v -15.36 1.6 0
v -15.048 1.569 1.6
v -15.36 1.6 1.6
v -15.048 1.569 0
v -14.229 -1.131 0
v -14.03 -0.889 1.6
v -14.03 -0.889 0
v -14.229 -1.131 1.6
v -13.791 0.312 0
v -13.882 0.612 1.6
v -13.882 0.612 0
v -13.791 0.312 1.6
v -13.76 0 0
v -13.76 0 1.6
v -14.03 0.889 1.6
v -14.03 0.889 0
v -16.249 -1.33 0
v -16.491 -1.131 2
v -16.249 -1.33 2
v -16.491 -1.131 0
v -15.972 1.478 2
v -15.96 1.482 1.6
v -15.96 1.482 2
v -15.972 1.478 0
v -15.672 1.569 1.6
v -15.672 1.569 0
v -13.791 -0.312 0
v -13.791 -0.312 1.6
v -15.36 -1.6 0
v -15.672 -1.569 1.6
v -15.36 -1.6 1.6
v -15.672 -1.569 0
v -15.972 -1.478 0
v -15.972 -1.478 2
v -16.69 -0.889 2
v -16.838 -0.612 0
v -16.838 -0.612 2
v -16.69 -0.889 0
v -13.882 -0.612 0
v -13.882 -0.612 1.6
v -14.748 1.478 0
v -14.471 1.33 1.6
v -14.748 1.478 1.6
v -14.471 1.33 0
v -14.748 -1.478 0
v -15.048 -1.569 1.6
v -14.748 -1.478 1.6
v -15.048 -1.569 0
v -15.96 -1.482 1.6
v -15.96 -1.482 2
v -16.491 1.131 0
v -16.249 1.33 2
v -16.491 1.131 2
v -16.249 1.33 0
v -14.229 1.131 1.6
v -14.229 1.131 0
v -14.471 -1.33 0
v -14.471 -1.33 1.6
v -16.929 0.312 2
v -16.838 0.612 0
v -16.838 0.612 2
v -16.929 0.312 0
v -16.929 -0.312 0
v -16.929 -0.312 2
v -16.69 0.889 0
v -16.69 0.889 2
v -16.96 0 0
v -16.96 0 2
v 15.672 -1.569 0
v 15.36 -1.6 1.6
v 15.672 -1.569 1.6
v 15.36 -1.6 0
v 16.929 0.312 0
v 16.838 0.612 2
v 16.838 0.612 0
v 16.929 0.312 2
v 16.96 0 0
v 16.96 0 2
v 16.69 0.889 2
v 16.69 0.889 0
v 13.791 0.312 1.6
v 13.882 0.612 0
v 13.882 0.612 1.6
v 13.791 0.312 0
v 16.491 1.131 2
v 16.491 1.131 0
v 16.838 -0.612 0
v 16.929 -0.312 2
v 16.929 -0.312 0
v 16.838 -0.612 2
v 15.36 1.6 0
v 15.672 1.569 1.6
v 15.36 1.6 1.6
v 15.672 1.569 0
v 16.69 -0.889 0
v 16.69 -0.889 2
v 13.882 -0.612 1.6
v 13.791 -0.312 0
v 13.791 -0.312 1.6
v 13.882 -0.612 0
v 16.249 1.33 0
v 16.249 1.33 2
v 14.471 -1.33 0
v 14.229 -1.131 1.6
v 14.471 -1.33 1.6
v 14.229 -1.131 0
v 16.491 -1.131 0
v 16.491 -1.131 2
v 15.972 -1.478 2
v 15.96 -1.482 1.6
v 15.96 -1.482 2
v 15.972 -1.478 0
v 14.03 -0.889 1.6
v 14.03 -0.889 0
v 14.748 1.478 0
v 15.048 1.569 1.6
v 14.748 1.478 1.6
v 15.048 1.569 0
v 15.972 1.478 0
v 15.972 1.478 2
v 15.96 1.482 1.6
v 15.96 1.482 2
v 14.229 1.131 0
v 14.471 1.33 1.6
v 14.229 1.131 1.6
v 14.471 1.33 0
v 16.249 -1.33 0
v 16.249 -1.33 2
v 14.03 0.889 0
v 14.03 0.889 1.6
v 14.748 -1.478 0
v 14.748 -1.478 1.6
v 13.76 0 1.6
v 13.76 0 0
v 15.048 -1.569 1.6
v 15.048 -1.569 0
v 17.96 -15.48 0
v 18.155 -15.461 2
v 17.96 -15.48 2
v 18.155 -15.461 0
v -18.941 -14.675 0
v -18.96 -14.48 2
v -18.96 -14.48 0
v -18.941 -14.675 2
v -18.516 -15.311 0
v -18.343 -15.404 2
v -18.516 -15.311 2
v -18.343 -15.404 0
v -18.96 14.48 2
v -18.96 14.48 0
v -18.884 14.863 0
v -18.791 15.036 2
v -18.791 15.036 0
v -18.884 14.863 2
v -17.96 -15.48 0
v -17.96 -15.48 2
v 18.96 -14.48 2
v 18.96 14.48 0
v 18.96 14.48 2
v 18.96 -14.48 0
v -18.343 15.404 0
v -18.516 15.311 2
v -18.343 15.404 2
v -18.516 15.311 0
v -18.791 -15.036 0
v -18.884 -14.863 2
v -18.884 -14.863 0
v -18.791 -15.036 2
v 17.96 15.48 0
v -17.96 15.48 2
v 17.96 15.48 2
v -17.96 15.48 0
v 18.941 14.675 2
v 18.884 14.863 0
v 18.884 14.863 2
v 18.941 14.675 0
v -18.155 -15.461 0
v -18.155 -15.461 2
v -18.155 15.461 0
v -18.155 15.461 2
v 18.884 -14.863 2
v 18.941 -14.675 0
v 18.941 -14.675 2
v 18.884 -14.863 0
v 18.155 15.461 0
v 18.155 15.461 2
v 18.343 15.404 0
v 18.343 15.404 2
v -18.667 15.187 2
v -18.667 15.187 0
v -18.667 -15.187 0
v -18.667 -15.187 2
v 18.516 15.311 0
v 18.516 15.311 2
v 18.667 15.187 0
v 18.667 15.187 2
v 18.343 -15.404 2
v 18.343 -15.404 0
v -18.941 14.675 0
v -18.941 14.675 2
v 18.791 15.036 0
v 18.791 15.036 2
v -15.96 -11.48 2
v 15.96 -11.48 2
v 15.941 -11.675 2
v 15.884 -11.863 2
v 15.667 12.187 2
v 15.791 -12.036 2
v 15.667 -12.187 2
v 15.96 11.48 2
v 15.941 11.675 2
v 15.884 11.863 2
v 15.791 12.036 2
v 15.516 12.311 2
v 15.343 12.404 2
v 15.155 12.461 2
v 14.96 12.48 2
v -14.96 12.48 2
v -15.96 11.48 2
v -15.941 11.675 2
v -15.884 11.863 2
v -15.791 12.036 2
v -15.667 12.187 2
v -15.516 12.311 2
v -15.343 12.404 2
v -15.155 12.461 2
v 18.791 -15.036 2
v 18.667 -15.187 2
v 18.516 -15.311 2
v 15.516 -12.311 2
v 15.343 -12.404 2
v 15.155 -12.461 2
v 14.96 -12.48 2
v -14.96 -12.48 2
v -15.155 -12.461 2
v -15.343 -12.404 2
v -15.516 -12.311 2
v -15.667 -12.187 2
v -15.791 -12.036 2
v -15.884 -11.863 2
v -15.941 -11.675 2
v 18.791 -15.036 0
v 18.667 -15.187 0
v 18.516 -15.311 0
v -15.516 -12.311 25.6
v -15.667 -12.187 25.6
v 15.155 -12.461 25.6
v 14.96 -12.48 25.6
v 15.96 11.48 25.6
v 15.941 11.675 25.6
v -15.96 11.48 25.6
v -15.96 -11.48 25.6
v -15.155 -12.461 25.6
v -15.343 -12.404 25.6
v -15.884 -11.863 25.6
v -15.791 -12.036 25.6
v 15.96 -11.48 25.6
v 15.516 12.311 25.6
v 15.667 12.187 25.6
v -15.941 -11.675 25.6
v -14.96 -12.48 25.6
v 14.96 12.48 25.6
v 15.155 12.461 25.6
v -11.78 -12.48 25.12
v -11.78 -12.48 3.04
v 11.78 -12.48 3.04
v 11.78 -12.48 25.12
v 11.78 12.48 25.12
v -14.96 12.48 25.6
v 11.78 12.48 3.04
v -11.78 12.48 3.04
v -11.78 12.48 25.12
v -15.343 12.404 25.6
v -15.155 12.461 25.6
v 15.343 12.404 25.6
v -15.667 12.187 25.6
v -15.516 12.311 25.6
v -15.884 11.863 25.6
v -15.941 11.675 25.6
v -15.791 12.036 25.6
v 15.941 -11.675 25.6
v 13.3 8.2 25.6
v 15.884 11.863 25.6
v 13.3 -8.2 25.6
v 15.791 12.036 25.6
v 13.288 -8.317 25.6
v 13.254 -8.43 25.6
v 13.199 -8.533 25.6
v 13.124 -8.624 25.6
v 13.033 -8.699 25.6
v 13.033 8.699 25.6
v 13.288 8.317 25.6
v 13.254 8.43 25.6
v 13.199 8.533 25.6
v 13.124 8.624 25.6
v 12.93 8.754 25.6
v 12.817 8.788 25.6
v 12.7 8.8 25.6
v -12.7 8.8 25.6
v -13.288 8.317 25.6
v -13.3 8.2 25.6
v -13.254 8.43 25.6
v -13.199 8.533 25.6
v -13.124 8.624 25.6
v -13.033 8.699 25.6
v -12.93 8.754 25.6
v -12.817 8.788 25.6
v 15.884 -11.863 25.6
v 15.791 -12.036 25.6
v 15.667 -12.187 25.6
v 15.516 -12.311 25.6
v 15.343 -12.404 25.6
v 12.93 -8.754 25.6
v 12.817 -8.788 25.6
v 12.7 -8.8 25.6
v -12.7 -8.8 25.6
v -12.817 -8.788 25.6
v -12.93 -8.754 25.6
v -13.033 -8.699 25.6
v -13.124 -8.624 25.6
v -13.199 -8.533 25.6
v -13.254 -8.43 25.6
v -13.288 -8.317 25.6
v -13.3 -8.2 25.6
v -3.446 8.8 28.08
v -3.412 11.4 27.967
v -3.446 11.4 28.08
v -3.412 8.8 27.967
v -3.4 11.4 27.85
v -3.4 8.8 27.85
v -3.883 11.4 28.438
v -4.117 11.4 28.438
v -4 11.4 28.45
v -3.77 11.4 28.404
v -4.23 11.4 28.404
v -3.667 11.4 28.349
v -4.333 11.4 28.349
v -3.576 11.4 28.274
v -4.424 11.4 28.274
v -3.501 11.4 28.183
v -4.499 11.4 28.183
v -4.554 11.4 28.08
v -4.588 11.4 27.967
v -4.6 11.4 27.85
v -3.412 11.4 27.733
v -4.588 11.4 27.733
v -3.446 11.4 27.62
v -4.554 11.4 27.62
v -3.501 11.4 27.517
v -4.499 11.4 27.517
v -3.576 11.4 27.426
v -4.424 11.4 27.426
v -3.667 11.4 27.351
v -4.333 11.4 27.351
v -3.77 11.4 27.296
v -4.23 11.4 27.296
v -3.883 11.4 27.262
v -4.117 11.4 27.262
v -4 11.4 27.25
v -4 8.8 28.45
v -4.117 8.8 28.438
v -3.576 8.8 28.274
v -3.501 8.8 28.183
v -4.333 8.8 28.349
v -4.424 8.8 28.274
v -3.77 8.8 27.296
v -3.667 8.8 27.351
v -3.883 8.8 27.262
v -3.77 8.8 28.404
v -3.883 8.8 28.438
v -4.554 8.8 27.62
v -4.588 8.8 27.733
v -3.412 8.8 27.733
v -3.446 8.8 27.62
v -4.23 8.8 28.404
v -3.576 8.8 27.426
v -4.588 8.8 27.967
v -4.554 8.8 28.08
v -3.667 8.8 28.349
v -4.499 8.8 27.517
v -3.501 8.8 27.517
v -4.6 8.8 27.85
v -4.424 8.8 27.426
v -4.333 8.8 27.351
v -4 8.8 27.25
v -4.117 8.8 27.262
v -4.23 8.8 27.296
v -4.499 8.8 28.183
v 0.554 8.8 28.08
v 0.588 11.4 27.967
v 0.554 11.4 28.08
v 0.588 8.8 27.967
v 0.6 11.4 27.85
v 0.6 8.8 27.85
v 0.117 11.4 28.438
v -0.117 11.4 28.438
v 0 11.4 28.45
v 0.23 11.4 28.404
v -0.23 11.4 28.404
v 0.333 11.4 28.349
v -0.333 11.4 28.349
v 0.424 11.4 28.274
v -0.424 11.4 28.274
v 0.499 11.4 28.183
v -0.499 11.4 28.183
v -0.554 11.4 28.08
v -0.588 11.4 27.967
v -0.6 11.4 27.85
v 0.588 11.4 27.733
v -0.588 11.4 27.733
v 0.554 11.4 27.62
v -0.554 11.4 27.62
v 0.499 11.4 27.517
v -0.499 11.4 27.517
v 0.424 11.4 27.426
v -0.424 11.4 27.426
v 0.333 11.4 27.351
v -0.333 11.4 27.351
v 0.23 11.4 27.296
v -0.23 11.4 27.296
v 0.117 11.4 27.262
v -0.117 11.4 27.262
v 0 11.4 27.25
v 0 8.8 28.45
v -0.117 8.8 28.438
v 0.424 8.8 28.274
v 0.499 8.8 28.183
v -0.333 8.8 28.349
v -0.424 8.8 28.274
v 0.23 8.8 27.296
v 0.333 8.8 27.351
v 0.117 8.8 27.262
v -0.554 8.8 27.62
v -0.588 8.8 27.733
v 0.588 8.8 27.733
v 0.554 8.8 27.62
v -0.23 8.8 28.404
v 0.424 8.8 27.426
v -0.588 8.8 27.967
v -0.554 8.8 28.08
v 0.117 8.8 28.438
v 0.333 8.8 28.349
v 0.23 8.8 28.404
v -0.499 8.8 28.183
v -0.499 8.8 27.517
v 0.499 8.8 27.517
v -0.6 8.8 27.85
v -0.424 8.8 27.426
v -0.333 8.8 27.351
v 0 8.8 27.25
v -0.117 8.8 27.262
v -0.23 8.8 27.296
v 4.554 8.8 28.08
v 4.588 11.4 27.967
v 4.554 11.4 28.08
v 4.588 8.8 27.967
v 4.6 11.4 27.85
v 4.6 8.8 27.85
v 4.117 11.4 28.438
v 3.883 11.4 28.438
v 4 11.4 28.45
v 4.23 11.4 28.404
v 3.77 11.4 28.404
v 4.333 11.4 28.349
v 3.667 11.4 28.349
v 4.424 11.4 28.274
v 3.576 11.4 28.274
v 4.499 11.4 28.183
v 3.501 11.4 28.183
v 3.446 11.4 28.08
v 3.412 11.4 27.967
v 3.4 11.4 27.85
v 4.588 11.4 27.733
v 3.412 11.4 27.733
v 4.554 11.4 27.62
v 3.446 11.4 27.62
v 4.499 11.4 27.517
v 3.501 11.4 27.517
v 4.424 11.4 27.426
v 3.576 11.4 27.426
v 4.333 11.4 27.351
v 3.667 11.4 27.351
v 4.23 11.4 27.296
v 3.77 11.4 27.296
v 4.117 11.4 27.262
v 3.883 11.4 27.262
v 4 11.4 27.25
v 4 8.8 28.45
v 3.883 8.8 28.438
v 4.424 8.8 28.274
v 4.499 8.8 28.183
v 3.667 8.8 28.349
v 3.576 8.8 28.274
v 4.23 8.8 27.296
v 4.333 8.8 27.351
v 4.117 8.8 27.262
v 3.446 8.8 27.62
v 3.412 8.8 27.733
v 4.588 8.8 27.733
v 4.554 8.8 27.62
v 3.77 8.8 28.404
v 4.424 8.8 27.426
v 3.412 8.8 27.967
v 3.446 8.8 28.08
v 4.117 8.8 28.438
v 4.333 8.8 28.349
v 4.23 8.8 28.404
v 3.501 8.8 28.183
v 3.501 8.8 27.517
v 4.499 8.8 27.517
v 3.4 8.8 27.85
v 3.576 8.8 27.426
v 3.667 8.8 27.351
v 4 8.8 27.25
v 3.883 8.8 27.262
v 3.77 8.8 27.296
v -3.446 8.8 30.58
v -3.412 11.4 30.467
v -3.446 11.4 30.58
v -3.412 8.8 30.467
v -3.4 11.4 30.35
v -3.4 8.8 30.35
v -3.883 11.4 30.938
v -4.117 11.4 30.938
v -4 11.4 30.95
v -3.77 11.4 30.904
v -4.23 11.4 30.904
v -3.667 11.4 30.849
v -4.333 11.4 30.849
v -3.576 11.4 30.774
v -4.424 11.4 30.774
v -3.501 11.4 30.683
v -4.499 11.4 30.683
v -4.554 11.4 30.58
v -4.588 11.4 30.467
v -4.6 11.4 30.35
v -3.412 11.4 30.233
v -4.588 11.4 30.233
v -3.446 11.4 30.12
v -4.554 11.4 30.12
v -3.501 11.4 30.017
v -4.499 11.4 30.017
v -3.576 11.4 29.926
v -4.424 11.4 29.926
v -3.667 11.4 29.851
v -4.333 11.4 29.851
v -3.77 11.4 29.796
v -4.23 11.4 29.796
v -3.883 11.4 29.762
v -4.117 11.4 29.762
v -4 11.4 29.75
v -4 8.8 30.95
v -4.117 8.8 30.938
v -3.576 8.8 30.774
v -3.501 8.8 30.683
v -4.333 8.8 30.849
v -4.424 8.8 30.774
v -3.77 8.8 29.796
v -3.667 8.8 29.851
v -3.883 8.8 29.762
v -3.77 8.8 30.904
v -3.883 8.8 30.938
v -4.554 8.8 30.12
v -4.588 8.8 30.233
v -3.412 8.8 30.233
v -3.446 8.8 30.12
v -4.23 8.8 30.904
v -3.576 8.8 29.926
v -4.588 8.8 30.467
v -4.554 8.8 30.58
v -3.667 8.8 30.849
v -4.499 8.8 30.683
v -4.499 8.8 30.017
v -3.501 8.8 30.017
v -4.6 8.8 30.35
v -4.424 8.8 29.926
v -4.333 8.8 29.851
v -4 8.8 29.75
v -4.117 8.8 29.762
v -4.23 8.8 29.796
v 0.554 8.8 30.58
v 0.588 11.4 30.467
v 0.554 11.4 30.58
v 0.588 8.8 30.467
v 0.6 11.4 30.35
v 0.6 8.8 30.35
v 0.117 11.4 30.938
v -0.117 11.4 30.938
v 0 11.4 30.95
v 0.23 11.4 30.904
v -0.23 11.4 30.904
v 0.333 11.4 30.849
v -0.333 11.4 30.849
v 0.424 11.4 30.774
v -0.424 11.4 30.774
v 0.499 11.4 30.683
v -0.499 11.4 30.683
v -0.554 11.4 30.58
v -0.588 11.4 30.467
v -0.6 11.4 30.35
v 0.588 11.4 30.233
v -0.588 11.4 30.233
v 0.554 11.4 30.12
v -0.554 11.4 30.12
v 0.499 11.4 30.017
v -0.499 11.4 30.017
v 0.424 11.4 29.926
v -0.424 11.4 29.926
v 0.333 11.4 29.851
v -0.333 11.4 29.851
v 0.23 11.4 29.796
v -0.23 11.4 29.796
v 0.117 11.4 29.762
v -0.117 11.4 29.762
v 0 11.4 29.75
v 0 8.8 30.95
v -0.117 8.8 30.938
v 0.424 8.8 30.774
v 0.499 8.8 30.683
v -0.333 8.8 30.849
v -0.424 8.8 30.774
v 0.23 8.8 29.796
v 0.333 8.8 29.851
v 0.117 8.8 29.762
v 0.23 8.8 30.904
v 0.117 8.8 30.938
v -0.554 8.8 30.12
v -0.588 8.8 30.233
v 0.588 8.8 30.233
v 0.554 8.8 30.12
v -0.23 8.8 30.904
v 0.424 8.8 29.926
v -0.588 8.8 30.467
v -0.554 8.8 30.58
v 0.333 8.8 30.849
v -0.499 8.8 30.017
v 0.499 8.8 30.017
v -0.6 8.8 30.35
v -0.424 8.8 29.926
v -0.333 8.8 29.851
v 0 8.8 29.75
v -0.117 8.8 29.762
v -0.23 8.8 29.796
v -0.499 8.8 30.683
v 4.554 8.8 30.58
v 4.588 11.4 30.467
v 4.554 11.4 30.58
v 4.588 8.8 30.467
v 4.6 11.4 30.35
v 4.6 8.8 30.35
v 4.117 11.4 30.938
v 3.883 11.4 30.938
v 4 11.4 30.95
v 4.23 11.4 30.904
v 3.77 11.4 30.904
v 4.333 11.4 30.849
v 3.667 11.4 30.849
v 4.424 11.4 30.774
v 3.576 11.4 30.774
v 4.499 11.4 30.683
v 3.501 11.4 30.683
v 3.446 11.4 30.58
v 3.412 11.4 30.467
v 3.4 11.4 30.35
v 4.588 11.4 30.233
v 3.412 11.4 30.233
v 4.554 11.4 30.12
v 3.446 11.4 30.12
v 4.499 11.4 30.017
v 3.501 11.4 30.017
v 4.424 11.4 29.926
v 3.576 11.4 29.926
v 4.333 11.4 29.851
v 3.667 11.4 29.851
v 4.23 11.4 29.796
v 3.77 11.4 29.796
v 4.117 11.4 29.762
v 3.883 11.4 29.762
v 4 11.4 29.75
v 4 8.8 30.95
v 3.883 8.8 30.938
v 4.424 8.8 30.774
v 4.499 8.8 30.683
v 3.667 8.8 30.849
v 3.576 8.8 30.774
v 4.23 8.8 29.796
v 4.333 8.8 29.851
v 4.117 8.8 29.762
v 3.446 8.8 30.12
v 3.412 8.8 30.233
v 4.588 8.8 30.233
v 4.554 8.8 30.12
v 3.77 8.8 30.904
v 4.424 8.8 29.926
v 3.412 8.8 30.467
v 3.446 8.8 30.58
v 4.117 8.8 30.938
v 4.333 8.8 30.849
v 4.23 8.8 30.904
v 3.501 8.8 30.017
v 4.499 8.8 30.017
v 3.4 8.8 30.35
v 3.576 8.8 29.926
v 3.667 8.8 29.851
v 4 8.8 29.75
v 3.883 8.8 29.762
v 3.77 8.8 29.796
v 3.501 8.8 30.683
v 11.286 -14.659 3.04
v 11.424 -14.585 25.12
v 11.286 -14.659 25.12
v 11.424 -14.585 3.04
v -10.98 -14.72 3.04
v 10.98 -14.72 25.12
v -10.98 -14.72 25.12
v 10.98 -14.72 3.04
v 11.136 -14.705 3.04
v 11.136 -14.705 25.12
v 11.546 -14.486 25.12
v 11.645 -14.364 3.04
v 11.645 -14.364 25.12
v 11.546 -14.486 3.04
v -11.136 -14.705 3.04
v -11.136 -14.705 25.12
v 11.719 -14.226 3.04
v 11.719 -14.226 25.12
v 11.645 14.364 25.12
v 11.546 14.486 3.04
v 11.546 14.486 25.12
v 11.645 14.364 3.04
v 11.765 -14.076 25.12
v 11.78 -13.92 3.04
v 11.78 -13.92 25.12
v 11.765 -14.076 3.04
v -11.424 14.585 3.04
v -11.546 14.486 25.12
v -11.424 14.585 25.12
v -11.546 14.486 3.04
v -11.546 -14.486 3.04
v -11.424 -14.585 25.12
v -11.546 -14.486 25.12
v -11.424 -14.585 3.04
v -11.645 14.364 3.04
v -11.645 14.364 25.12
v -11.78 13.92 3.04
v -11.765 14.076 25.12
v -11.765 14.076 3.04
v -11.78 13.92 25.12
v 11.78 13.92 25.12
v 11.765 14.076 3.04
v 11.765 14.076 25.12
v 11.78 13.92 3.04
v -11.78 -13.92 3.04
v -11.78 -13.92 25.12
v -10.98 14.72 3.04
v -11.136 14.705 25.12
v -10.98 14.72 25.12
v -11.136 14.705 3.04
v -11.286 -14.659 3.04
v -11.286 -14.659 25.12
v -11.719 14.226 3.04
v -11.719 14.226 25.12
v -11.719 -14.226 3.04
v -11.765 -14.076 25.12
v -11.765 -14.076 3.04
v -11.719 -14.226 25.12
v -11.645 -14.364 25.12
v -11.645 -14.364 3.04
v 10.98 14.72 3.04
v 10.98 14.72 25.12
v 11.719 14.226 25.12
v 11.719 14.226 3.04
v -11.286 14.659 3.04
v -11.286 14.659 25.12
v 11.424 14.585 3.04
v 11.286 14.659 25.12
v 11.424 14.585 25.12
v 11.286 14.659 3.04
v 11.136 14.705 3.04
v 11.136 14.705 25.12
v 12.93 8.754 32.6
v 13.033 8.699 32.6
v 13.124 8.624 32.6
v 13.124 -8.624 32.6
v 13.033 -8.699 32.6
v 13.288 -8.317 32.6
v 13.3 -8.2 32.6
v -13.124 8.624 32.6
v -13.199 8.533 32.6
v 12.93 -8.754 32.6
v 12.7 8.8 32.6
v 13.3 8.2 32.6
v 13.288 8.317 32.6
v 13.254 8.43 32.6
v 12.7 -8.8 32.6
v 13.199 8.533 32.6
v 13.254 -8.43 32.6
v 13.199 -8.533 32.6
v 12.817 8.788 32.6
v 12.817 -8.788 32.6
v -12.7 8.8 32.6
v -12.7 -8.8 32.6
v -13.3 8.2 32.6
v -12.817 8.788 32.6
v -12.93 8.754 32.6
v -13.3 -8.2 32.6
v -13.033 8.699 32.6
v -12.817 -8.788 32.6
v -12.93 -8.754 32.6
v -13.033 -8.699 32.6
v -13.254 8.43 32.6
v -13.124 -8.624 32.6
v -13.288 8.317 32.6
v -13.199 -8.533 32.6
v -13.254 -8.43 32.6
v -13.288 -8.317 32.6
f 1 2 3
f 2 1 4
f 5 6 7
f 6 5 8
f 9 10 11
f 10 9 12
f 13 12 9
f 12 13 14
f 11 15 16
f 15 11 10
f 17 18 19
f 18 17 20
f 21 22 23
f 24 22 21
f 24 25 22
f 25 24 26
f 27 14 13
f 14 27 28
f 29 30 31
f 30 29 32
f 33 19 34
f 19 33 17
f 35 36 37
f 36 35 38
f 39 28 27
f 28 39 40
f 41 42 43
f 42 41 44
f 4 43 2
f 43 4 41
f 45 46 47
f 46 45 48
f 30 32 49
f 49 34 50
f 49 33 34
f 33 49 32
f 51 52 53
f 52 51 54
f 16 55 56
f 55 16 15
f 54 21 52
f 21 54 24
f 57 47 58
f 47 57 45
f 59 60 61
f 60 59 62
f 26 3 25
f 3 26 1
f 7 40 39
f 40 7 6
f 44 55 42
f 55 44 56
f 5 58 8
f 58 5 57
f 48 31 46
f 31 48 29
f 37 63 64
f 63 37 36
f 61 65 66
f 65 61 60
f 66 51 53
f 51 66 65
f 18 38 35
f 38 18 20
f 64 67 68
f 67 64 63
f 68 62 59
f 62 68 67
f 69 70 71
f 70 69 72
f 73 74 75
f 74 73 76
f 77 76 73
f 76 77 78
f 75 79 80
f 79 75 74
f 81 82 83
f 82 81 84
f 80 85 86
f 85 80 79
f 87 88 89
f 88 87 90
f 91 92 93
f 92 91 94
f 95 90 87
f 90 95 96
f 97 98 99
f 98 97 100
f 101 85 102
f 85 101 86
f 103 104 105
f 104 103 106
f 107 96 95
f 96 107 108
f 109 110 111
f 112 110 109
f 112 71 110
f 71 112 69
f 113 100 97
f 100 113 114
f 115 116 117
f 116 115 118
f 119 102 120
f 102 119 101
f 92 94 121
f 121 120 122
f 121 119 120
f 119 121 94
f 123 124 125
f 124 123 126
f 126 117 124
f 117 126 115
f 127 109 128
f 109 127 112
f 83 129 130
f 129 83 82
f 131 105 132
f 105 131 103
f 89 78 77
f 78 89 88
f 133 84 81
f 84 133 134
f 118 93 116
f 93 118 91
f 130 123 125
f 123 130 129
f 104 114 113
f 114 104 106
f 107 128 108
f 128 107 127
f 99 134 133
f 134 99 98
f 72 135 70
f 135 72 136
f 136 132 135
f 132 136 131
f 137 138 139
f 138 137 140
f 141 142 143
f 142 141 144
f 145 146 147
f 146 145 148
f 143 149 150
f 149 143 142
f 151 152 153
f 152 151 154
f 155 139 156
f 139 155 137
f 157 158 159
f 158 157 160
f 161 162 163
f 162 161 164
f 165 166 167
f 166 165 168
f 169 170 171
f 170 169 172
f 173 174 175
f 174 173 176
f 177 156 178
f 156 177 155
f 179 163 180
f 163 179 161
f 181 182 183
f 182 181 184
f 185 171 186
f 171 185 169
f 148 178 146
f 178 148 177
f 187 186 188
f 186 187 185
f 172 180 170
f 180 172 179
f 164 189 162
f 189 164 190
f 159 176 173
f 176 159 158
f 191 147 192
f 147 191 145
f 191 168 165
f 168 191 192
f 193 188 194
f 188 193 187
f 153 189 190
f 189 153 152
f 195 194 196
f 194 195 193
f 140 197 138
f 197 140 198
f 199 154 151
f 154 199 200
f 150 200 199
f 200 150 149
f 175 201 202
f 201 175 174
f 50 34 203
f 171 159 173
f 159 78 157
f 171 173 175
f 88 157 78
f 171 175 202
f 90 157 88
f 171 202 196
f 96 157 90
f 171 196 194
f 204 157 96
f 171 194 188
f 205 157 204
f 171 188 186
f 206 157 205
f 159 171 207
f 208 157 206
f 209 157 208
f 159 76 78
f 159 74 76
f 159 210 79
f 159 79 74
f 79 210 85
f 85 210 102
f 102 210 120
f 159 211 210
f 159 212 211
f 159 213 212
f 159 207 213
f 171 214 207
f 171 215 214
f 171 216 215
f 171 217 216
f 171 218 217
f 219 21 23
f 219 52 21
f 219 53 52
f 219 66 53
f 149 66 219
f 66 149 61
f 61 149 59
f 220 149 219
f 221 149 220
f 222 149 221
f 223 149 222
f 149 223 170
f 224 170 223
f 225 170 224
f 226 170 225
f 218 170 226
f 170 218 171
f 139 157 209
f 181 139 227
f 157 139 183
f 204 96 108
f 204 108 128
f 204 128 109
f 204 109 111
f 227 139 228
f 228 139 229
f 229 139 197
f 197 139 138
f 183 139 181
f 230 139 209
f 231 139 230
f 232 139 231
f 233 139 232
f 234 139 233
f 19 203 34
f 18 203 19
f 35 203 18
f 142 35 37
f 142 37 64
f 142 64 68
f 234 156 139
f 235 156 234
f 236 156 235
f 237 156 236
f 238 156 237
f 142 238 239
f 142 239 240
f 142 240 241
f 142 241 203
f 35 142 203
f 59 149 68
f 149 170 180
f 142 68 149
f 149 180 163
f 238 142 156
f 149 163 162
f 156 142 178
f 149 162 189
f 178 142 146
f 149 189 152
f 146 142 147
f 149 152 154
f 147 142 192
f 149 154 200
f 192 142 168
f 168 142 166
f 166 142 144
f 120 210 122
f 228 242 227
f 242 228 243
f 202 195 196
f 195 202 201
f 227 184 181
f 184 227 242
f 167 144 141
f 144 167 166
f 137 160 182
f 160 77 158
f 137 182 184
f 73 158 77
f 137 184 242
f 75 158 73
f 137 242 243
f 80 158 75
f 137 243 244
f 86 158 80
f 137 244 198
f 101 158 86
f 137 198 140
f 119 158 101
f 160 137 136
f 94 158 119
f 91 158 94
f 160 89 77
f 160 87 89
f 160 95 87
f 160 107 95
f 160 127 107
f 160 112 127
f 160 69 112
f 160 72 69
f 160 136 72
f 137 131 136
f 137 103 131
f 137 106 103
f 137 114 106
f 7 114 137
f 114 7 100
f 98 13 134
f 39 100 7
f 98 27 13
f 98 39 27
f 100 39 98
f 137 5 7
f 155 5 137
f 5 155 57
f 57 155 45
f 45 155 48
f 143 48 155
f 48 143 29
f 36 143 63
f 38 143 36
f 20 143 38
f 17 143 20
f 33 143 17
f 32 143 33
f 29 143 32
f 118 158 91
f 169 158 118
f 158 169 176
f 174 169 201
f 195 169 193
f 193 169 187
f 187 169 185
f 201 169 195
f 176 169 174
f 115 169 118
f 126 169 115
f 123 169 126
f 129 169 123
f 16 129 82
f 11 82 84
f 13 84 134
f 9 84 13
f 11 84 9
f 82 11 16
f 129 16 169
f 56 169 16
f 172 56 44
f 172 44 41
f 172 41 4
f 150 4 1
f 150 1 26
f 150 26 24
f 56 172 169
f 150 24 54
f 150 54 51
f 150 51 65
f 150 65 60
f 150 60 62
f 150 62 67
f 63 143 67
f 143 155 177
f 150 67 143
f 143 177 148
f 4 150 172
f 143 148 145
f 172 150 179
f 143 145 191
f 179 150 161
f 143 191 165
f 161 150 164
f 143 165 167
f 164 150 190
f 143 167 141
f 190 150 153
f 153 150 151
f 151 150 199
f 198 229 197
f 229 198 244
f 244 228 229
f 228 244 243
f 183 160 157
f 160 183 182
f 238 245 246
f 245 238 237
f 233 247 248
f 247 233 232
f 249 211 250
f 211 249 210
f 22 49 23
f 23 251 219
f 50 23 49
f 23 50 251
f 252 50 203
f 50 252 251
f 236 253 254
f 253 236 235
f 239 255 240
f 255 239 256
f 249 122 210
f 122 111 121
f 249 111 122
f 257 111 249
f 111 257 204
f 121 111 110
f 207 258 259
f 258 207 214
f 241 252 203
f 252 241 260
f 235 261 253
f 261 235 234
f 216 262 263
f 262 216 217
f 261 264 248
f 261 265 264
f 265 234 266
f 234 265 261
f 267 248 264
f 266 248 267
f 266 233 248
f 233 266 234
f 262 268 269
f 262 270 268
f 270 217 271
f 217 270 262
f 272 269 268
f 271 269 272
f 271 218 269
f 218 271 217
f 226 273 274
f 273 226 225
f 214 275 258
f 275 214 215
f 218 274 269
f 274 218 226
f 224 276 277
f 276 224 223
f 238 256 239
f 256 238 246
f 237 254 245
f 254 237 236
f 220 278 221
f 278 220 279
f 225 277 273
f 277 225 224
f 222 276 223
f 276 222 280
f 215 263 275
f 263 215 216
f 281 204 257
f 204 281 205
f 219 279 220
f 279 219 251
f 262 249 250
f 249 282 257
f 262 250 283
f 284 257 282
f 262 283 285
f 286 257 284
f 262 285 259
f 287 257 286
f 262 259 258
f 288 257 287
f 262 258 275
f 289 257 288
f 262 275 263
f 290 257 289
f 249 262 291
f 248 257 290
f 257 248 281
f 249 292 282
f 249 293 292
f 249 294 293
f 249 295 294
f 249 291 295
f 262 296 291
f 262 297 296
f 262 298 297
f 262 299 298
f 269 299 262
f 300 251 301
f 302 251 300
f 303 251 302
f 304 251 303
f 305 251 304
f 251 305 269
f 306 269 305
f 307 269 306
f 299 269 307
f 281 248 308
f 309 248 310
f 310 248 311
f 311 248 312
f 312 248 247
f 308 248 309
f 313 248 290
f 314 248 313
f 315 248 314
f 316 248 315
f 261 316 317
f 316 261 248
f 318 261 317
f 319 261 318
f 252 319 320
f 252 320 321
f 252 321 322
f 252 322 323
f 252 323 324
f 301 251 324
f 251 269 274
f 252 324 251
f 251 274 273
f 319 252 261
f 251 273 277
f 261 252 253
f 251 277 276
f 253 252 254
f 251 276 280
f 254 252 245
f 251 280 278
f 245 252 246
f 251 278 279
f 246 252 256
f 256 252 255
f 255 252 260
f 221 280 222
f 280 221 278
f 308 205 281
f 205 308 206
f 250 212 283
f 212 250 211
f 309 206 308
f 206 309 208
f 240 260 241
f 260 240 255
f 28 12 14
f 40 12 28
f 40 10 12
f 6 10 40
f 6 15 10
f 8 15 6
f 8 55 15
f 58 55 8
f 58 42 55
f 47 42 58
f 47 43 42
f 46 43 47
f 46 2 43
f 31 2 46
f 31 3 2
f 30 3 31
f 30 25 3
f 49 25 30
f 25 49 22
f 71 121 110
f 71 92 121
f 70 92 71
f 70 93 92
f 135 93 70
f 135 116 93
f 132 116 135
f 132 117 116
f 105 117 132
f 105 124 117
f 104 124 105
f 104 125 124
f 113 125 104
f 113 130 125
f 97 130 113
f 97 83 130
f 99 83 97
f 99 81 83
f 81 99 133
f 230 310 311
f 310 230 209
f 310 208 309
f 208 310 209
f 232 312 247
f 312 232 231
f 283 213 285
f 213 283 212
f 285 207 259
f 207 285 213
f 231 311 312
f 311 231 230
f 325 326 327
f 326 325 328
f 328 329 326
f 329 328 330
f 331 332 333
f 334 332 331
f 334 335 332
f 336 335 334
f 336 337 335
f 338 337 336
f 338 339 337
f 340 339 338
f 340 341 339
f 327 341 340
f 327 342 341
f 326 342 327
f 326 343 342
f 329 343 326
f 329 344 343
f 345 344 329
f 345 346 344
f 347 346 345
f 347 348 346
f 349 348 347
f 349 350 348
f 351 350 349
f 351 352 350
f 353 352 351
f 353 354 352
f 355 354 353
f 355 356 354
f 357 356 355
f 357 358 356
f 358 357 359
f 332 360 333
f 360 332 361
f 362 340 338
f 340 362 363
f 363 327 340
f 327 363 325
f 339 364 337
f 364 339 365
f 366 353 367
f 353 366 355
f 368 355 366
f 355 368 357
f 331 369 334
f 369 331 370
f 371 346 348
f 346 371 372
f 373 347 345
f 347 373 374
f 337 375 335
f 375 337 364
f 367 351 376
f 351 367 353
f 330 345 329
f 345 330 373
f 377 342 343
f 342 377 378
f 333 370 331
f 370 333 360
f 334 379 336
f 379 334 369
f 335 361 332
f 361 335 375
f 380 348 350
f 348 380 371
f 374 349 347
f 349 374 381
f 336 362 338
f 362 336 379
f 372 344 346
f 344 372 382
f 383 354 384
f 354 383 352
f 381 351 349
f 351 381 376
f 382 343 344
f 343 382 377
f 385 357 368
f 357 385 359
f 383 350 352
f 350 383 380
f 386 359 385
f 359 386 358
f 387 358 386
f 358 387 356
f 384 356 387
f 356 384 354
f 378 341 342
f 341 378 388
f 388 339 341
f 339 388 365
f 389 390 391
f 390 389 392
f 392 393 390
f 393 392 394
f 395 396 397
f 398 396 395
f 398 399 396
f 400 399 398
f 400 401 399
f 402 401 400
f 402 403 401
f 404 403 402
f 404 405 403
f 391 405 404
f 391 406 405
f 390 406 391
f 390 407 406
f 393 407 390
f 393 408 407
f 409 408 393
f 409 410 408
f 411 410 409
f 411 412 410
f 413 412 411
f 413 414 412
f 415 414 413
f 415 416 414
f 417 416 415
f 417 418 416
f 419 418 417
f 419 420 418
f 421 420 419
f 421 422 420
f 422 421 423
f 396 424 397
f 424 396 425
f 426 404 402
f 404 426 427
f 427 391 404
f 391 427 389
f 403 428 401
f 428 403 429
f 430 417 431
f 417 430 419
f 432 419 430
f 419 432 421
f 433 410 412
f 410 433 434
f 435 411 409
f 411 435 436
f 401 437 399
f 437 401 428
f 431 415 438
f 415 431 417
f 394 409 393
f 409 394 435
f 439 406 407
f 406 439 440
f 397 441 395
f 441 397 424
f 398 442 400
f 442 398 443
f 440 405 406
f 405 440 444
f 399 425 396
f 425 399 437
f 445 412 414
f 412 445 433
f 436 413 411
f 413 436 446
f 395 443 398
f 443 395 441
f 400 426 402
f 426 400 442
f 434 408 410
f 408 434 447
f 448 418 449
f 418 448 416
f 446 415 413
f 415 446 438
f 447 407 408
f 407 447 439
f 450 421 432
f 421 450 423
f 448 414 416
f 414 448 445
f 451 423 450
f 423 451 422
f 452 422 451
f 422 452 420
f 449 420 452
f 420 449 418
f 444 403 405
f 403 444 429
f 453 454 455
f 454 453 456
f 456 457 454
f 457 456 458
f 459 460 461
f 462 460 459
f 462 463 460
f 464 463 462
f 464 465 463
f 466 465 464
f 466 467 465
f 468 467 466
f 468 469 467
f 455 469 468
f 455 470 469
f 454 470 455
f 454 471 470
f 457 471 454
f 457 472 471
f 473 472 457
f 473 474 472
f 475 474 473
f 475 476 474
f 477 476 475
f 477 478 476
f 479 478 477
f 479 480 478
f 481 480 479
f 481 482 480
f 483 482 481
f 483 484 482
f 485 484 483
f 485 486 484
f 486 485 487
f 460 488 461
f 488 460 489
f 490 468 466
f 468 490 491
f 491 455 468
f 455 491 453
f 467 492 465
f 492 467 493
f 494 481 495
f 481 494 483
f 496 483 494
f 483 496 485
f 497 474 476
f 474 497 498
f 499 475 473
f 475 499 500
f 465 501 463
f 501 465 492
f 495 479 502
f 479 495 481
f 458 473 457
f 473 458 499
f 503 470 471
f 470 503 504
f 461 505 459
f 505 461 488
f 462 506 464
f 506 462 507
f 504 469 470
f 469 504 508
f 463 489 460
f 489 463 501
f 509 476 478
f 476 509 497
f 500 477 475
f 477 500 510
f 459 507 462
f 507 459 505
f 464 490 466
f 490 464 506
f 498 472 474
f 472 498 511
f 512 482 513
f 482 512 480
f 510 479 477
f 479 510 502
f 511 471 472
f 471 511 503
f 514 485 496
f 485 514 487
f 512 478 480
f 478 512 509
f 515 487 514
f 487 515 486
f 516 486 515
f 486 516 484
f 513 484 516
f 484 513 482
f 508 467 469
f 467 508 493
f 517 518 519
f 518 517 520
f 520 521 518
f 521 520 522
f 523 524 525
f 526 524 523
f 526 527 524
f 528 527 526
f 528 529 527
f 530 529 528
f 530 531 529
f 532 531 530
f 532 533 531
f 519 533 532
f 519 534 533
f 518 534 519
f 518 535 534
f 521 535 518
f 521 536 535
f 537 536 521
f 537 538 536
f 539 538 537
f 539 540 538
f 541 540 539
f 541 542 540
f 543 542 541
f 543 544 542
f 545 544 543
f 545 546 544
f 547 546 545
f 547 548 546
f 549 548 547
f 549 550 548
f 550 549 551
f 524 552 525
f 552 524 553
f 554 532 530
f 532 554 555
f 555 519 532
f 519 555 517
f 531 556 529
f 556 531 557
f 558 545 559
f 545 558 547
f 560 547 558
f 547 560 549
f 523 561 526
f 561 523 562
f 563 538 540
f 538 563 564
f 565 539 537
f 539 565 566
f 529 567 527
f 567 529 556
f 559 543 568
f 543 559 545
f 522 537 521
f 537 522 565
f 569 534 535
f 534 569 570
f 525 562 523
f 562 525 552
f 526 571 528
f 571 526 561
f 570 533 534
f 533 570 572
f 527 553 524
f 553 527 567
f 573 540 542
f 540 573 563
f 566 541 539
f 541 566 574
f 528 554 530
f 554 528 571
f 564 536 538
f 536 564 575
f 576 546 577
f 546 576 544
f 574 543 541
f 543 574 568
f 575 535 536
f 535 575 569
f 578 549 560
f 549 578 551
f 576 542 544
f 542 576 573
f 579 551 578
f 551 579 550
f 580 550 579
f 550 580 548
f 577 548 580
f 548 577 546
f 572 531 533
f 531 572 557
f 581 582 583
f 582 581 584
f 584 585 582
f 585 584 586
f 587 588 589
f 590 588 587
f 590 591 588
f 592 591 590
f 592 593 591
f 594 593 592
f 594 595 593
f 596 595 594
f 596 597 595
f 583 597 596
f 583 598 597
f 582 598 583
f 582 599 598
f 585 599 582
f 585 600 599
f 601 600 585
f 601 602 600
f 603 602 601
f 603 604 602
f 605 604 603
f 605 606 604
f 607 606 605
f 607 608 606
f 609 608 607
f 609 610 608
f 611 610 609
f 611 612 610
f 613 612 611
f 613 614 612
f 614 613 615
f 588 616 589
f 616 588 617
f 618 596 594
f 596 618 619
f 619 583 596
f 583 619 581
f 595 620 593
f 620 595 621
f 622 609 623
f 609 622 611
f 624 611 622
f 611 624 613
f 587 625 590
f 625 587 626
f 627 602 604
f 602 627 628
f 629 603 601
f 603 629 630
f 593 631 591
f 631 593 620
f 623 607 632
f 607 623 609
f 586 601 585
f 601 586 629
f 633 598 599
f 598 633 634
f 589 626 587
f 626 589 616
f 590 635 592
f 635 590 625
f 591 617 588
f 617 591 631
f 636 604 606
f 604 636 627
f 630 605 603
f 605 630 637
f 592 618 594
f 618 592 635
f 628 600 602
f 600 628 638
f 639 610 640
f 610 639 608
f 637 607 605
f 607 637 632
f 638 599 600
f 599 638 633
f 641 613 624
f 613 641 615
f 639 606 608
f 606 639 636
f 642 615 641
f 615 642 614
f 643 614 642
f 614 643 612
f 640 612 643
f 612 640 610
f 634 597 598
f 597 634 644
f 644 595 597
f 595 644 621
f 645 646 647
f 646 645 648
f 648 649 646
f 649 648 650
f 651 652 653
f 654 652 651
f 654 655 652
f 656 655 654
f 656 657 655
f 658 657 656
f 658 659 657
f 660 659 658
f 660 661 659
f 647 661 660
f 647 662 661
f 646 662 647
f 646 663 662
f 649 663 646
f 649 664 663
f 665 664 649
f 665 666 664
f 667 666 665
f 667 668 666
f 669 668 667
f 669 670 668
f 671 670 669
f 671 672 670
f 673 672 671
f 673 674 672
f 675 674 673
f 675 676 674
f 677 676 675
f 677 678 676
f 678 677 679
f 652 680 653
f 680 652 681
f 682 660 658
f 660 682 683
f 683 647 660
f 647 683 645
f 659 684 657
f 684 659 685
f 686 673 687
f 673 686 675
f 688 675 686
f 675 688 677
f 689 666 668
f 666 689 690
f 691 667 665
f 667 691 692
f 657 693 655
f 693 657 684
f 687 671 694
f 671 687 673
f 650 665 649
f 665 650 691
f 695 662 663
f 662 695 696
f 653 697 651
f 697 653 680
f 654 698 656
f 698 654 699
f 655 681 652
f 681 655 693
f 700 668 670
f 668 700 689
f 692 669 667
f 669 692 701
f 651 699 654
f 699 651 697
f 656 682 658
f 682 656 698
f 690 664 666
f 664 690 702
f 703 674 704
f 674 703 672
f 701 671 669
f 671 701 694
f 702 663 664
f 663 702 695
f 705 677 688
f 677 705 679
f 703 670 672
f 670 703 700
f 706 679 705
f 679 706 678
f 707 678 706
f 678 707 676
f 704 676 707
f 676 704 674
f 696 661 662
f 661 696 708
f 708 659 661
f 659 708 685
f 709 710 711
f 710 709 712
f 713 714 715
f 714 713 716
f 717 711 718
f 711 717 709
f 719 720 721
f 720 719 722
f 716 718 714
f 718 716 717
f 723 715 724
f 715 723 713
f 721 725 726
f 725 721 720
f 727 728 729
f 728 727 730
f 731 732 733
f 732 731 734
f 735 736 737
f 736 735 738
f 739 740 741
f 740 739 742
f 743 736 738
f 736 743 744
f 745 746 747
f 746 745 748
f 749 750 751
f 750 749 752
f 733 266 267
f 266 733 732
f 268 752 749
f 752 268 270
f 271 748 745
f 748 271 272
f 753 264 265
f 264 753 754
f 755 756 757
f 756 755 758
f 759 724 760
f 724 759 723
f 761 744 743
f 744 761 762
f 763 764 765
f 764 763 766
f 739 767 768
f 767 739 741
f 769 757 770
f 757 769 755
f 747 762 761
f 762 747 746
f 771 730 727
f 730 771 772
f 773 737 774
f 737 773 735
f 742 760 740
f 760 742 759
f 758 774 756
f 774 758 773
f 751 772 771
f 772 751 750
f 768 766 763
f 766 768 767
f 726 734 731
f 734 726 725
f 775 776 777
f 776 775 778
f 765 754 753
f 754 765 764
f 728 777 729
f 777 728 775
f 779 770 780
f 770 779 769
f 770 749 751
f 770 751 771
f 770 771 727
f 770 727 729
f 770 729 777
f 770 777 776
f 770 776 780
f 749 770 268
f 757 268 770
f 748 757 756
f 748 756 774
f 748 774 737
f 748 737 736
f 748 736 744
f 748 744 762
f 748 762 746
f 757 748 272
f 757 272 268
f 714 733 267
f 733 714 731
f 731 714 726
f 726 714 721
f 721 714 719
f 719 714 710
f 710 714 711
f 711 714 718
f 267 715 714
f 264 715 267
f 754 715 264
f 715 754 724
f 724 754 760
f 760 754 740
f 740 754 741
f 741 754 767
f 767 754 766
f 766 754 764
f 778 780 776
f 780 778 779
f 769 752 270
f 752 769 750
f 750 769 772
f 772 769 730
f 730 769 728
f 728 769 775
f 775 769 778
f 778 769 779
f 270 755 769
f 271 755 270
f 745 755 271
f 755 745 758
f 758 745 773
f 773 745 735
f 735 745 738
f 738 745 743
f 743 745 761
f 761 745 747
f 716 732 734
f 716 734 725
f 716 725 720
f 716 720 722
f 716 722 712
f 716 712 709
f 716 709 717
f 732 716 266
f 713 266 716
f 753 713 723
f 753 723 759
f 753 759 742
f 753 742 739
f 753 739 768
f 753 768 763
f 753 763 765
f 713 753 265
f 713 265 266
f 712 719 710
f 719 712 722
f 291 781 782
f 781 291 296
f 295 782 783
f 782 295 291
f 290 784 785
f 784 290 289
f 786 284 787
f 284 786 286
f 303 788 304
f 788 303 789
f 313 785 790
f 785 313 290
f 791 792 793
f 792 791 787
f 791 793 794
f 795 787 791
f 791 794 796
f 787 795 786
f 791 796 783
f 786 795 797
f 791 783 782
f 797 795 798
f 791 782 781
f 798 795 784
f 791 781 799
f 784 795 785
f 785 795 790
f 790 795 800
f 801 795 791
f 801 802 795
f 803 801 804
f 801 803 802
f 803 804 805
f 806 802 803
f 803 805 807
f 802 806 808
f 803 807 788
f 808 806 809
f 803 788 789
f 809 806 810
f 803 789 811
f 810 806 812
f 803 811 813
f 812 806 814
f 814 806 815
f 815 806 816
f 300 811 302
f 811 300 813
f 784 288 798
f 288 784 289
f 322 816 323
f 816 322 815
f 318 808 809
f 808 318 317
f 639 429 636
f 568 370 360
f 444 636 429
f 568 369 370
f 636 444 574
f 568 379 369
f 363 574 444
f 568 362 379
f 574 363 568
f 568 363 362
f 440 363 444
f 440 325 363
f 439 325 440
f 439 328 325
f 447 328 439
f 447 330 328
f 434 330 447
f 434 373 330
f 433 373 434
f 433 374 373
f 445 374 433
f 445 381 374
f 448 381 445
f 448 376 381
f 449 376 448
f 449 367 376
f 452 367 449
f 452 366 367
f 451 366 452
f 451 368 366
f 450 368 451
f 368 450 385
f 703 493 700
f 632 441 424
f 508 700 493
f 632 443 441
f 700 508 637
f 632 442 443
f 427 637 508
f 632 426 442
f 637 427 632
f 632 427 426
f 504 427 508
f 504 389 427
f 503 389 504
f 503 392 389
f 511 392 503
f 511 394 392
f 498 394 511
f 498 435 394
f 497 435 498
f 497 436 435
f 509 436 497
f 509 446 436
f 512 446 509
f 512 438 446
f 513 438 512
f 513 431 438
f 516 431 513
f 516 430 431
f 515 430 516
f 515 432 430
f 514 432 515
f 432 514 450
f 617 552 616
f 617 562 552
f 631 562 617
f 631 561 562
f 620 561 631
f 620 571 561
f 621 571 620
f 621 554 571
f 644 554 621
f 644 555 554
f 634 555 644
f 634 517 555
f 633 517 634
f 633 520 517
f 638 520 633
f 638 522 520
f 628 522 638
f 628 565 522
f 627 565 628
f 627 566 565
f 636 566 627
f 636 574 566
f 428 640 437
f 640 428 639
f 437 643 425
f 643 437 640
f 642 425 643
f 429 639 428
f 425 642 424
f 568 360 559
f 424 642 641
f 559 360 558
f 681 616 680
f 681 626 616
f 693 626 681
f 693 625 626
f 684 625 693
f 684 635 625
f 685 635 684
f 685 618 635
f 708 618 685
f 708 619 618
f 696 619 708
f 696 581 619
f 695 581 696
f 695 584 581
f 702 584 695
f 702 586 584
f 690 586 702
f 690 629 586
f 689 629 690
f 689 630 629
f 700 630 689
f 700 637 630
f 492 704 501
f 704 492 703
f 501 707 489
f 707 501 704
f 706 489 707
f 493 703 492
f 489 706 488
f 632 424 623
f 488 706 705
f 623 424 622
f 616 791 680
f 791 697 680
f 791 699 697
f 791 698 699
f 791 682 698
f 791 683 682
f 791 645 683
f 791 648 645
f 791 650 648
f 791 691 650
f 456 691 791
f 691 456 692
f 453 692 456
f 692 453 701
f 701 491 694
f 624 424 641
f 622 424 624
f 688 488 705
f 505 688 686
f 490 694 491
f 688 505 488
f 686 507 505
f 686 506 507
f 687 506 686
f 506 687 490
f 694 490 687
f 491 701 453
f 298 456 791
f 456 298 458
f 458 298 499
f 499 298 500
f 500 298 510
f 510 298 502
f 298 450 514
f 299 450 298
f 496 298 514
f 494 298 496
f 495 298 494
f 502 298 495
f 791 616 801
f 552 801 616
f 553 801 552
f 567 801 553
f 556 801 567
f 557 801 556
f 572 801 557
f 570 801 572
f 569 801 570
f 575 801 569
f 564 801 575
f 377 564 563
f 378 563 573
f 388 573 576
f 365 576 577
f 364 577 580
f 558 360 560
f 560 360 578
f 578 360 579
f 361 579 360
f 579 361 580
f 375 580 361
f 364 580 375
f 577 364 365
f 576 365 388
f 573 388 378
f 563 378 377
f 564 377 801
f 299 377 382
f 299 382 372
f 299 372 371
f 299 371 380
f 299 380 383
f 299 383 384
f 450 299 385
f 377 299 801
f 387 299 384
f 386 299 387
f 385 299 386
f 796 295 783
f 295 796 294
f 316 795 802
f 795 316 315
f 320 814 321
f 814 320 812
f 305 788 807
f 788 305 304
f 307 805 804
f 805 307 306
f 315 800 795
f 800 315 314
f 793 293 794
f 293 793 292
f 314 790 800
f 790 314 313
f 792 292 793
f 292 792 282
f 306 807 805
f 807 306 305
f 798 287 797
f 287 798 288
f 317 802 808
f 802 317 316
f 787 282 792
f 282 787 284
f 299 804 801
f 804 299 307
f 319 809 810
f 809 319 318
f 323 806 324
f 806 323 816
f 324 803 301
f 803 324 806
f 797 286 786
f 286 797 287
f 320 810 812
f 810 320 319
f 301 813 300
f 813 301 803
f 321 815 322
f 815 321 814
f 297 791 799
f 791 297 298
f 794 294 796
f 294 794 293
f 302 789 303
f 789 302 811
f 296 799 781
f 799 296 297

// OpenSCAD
// Mains transformer 38.0mm x 32.0mm x 33.0mm
// Simplified for fast rendering: no hull/sphere rounding, reduced $fn, fewer expensive ops.

$fn = 32;

// Overall target envelope
overall_width  = 38;   // X
overall_depth  = 32;   // Y
overall_height = 33;   // Z

// Feature controls
include_footplate      = 1;  // [0:1]
include_mounting_holes = 1;  // [0:1]
include_terminal_block = 1;  // [0:1]

// Geometry parameters
eps_overlap = 0.4;

// Footplate
foot_thickness = 2;
foot_margin_x  = 3;
foot_margin_y  = 3;

// Core/bobbin proportions
lamination_height      = 24;
lamination_width_ratio = 0.84;
lamination_depth_ratio = 0.78;

bobbin_width_ratio  = 0.62;
bobbin_depth_ratio  = 0.92;
bobbin_height_ratio_of_lamination = 0.92;

// Core window (visual transformer feature)
window_width_ratio  = 0.38;  // of lam_w
window_depth_ratio  = 0.42;  // of lam_d
window_height_ratio = 0.70;  // of lam_h
window_bottom_clear = 3.0;   // mm from bottom of lamination to window start

// Mounting holes
mounting_hole_diameter = 3.2;
corner_radius = 2;

// Terminal block
terminal_height_ratio = 0.27;
terminal_depth_ratio  = 0.55;
terminal_width_ratio  = 0.70;

// Pins/terminals (kept within overall envelope)
pin_d = 1.2;
pin_len = 3.0; // protrude in +Y direction
pin_rows = 2;
pins_per_row = 3;
pin_pitch_x = 4.0;
pin_pitch_z = 2.5;

// Derived sizes
foot_on = (include_footplate > 0) ? 1 : 0;
term_on = (include_terminal_block > 0) ? 1 : 0;

foot_h = foot_on ? foot_thickness : 0;

lam_w = overall_width  * lamination_width_ratio;
lam_d = overall_depth  * lamination_depth_ratio;
lam_h = lamination_height;

bob_w = overall_width  * bobbin_width_ratio;
bob_d = overall_depth  * bobbin_depth_ratio;
bob_h = lam_h * bobbin_height_ratio_of_lamination;

foot_w = lam_w + 2*foot_margin_x;
foot_d = lam_d + 2*foot_margin_y;

// Terminal block height constrained to keep total height exactly overall_height
term_h_nom = overall_height * terminal_height_ratio;
term_h_max = max(0, overall_height - (foot_h + lam_h));
term_h     = term_on ? min(term_h_nom, term_h_max) : 0;

term_w = overall_width * terminal_width_ratio;
term_d = overall_depth * terminal_depth_ratio;

// Ensure terminal block doesn't exceed overall depth when pins are added
term_d_eff = term_on ? min(term_d, overall_depth - pin_len) : 0;

// Z placement (stacked with slight overlaps for connectivity)
z0 = 0; // bottom of model

z_foot_center = z0 + foot_h/2;
z_lam_center  = z0 + foot_h + lam_h/2 - eps_overlap;
z_bob_center  = z0 + foot_h + lam_h/2 + eps_overlap*0.2;
z_term_center = z0 + foot_h + lam_h + term_h/2 - eps_overlap;

// Fast rounded rectangle prism using 2D offset (much cheaper than hull of spheres)
module rounded_box(size=[10,10,10], r=1, center=true) {
    r2 = max(0, min(r, min(size[0], size[1]) / 2));
    translate(center ? [0,0,0] : [size[0]/2, size[1]/2, size[2]/2])
        linear_extrude(height=size[2], center=true, convexity=4)
            offset(r=r2)
                square([max(0.01, size[0]-2*r2), max(0.01, size[1]-2*r2)], center=true);
}

// Modules
module lamination_core_block() {
    win_w = lam_w * window_width_ratio;
    win_d = lam_d * window_depth_ratio;
    win_h = lam_h * window_height_ratio;

    win_z_center = (z0 + foot_h) + window_bottom_clear + win_h/2;

    difference() {
        translate([0, 0, z_lam_center])
            rounded_box([lam_w, lam_d, lam_h], r=1.0);

        translate([0, 0, win_z_center])
            cube([win_w, win_d, win_h], center=true);
    }
}

module bobbin_body() {
    translate([0, 0, z_bob_center])
        rounded_box([bob_w, bob_d, bob_h], r=0.8);
}

module mounting_footplate_raw() {
    if (foot_on)
        translate([0, 0, z_foot_center])
            rounded_box([foot_w, foot_d, foot_h], r=1.0);
}

module mounting_holes() {
    if (foot_on && include_mounting_holes) {
        x_off = foot_w/2 - (mounting_hole_diameter/2 + corner_radius);
        translate([-x_off, 0, z_foot_center])
            cylinder(d=mounting_hole_diameter, h=foot_h + 2*eps_overlap, center=true);
        translate([ x_off, 0, z_foot_center])
            cylinder(d=mounting_hole_diameter, h=foot_h + 2*eps_overlap, center=true);
    }
}

module mounting_footplate() {
    if (foot_on) {
        if (include_mounting_holes) {
            difference() {
                mounting_footplate_raw();
                mounting_holes();
            }
        } else {
            mounting_footplate_raw();
        }
    }
}

module terminal_block_volume() {
    if (term_on && term_h > 0)
        translate([0, 0, z_term_center])
            rounded_box([term_w, term_d_eff, term_h], r=0.6);
}

module terminal_pins() {
    if (term_on && term_h > 0) {
        y_pin_center = term_d_eff/2 + pin_len/2 - eps_overlap;

        z_span  = (pin_rows-1) * pin_pitch_z;
        z_start = z_term_center - z_span/2;

        x_span  = (pins_per_row-1) * pin_pitch_x;
        x_start = -x_span/2;

        for (rz = [0:pin_rows-1])
            for (ix = [0:pins_per_row-1]) {
                x = x_start + ix*pin_pitch_x;
                z = z_start + rz*pin_pitch_z;

                if (abs(x) <= term_w/2 - pin_d && abs(z - z_term_center) <= term_h/2 - pin_d)
                    translate([x, y_pin_center, z])
                        rotate([90, 0, 0])
                            cylinder(d=pin_d, h=pin_len, center=true);
            }
    }
}

// Final assembly
module transformer() {
    union() {
        mounting_footplate();
        lamination_core_block();
        bobbin_body();
        terminal_block_volume();
        terminal_pins();
    }
}

transformer();
